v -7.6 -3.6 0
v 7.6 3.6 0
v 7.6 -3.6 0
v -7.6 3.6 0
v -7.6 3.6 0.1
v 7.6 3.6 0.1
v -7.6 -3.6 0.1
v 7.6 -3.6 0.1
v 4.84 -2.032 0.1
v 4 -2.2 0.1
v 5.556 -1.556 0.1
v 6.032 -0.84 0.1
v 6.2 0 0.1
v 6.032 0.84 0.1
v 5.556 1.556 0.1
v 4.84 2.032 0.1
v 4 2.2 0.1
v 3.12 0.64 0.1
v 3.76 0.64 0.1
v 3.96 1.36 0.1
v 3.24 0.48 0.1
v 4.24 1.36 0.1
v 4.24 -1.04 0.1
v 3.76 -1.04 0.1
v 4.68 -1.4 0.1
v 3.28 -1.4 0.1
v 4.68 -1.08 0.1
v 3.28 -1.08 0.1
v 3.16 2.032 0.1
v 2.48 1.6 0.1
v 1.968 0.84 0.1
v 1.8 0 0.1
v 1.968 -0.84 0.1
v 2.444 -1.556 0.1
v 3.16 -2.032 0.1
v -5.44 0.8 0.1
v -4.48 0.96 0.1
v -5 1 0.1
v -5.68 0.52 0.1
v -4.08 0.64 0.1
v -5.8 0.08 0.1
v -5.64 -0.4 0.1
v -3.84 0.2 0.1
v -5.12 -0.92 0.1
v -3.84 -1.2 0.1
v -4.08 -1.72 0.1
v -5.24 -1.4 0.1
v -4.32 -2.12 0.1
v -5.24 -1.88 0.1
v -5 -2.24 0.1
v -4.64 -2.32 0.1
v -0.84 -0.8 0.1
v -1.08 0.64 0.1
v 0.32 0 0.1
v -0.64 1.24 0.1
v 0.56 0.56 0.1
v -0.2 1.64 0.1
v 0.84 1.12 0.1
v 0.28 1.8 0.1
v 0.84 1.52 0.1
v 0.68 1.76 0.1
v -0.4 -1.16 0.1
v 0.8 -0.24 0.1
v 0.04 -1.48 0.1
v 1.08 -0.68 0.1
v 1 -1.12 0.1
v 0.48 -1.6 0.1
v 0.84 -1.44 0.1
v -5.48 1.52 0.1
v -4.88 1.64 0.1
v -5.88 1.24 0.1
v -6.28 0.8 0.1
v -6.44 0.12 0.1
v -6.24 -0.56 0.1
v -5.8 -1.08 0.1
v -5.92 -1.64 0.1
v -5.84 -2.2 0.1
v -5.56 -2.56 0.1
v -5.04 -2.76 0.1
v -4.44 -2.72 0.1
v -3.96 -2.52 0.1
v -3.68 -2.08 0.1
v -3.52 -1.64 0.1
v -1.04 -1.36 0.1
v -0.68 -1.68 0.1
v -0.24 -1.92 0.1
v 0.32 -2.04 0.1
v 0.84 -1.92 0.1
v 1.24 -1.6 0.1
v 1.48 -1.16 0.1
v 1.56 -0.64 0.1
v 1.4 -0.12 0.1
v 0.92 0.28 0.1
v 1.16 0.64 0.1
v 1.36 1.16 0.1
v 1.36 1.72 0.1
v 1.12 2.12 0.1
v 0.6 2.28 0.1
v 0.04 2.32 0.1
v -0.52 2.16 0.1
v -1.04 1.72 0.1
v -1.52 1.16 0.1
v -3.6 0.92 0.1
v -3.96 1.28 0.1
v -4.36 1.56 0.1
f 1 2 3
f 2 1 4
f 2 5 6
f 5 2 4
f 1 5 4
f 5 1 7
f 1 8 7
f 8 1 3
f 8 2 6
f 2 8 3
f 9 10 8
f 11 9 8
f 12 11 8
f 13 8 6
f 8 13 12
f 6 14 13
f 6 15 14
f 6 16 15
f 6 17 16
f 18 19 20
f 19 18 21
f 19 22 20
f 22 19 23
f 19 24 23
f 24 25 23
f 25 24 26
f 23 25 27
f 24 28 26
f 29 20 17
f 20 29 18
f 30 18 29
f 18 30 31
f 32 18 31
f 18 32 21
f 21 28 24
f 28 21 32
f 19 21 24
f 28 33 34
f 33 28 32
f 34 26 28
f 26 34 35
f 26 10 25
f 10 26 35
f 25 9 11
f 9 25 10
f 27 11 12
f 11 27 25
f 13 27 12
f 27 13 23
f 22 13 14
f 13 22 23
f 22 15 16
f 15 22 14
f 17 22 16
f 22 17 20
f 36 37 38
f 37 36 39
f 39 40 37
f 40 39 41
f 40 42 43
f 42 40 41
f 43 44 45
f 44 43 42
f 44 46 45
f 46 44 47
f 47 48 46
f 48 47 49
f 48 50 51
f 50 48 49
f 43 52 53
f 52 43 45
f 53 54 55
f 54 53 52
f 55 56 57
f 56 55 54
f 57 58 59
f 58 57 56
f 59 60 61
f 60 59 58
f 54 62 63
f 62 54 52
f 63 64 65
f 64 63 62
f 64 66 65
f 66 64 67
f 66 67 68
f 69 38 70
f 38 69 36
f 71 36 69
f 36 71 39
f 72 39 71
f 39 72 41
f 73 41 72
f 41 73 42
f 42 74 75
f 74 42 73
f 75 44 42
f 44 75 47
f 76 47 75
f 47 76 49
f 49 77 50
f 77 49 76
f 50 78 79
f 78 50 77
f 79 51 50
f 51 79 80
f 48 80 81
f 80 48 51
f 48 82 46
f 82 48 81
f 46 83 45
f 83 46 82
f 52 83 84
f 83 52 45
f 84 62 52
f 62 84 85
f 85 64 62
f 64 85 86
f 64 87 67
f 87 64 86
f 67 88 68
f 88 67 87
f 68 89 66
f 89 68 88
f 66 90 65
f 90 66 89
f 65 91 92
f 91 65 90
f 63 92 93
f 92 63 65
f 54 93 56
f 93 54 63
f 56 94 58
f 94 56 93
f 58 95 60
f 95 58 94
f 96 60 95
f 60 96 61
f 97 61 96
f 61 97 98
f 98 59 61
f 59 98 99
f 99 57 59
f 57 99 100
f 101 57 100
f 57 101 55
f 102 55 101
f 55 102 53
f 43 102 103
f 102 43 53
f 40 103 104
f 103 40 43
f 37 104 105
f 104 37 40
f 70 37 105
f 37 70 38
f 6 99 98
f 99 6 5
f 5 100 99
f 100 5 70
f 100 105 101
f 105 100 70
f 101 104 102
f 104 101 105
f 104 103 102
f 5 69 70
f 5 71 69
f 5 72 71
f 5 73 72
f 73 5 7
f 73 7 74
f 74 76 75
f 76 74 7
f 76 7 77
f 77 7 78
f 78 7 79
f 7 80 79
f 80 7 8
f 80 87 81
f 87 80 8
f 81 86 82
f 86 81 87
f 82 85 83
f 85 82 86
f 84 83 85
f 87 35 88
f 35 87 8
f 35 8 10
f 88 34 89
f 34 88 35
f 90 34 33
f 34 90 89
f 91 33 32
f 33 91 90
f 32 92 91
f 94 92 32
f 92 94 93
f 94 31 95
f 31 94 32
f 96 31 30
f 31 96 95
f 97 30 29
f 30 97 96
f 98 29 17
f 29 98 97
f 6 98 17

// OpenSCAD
// file: ../p/box5-12.scad
use <../lib.scad>
function ldraw_lib__box5_12() = [
// 0 Box with 5 Faces without Any Edges
// 0 Name: box5-12.dat
// 0 Author: Chris Dee [cwdee]
// 0 !LDRAW_ORG Primitive UPDATE 2009-02
// 0 !LICENSE Licensed under CC BY 4.0 : see CAreadme.txt
// 
// 0 BFC CERTIFY CCW
  [0,"BFC","CERTIFY"],
  [0,"BFC","CCW"],
// 
// 0 !HISTORY 2009-09-03 [PTadmin] Official Update 2009-02
// 
// 
// 4 16 1 1 1 1 1 -1 -1 1 -1 -1 1 1
  [4,16,1,1,1,1,1,-1,-1,1,-1,-1,1,1],
// 4 16 -1 0 1 1 0 1 1 1 1 -1 1 1
  [4,16,-1,0,1,1,0,1,1,1,1,-1,1,1],
// 4 16 -1 0 -1 -1 0 1 -1 1 1 -1 1 -1
  [4,16,-1,0,-1,-1,0,1,-1,1,1,-1,1,-1],
// 4 16 1 0 -1 -1 0 -1 -1 1 -1 1 1 -1
  [4,16,1,0,-1,-1,0,-1,-1,1,-1,1,1,-1],
// 4 16 1 0 1 1 0 -1 1 1 -1 1 1 1
  [4,16,1,0,1,1,0,-1,1,1,-1,1,1,1],
// 0
];
module ldraw_lib__box5_12(step=0, col=false, unit=2/5, alt=false, line=0.2, solid=!$preview)
    makepoly(ldraw_lib__box5_12(), step=step, col=col, unit=unit, alt=alt, line=line, solid=solid);
ldraw_lib__box5_12(line=0.2);
// main file
use <../lib.scad>
use <../p/box5-12.scad>
function ldraw_lib__6018377f() = [
// 0 Sticker  0.9 x  1.9 with Dog Bone and Medium Lavender "1" in White Circle on Medium Azure Background
// 0 Name: 6018377f.dat
// 0 Author: Takeshi Takahashi [RainbowDolphin]
// 0 !LDRAW_ORG Part UPDATE 2025-07
// 0 !LICENSE Licensed under CC BY 4.0 : see CAreadme.txt
// 
// 0 BFC CERTIFY CCW
  [0,"BFC","CERTIFY"],
  [0,"BFC","CCW"],
// 
// 0 !KEYWORDS Pet salon, Price card, Set 41007
// 
// 0 !HISTORY 2025-07-27 [OrionP] Official Update 2025-07
// 
// 
// 1 16 0 -0.25 0 19 0 0 0 0.25 0 0 0 9 box5-12.dat
  [1,16,0,-0.25,0,19,0,0,0,0.25,0,0,0,9, ldraw_lib__box5_12()],
// 3 322 12.1 -0.25 -5.08 10 -0.25 -5.5 19 -0.25 -9
  [3,322,12.1,-0.25,-5.08,10,-0.25,-5.5,19,-0.25,-9],
// 3 322 13.89 -0.25 -3.89 12.1 -0.25 -5.08 19 -0.25 -9
  [3,322,13.89,-0.25,-3.89,12.1,-0.25,-5.08,19,-0.25,-9],
// 3 322 15.08 -0.25 -2.1 13.89 -0.25 -3.89 19 -0.25 -9
  [3,322,15.08,-0.25,-2.1,13.89,-0.25,-3.89,19,-0.25,-9],
// 4 322 15.5 -0.25 0 15.08 -0.25 -2.1 19 -0.25 -9 19 -0.25 9
  [4,322,15.5,-0.25,0,15.08,-0.25,-2.1,19,-0.25,-9,19,-0.25,9],
// 3 322 19 -0.25 9 15.08 -0.25 2.1 15.5 -0.25 0
  [3,322,19,-0.25,9,15.08,-0.25,2.1,15.5,-0.25,0],
// 3 322 19 -0.25 9 13.89 -0.25 3.89 15.08 -0.25 2.1
  [3,322,19,-0.25,9,13.89,-0.25,3.89,15.08,-0.25,2.1],
// 3 322 19 -0.25 9 12.1 -0.25 5.08 13.89 -0.25 3.89
  [3,322,19,-0.25,9,12.1,-0.25,5.08,13.89,-0.25,3.89],
// 3 322 19 -0.25 9 10 -0.25 5.5 12.1 -0.25 5.08
  [3,322,19,-0.25,9,10,-0.25,5.5,12.1,-0.25,5.08],
// 4 30 7.8 -0.25 1.6 8.1 -0.25 1.2 9.4 -0.25 1.6 9.9 -0.25 3.4
  [4,30,7.8,-0.25,1.6,8.1,-0.25,1.2,9.4,-0.25,1.6,9.9,-0.25,3.4],
// 4 30 10.6 -0.25 3.4 9.9 -0.25 3.4 9.4 -0.25 1.6 10.6 -0.25 -2.6
  [4,30,10.6,-0.25,3.4,9.9,-0.25,3.4,9.4,-0.25,1.6,10.6,-0.25,-2.6],
// 3 30 9.4 -0.25 1.6 9.4 -0.25 -2.6 10.6 -0.25 -2.6
  [3,30,9.4,-0.25,1.6,9.4,-0.25,-2.6,10.6,-0.25,-2.6],
// 4 30 10.6 -0.25 -2.6 9.4 -0.25 -2.6 8.2 -0.25 -3.5 11.7 -0.25 -3.5
  [4,30,10.6,-0.25,-2.6,9.4,-0.25,-2.6,8.2,-0.25,-3.5,11.7,-0.25,-3.5],
// 3 30 10.6 -0.25 -2.6 11.7 -0.25 -3.5 11.7 -0.25 -2.7
  [3,30,10.6,-0.25,-2.6,11.7,-0.25,-3.5,11.7,-0.25,-2.7],
// 3 30 9.4 -0.25 -2.6 8.2 -0.25 -2.7 8.2 -0.25 -3.5
  [3,30,9.4,-0.25,-2.6,8.2,-0.25,-2.7,8.2,-0.25,-3.5],
// 4 15 9.9 -0.25 3.4 10 -0.25 5.5 7.9 -0.25 5.08 7.8 -0.25 1.6
  [4,15,9.9,-0.25,3.4,10,-0.25,5.5,7.9,-0.25,5.08,7.8,-0.25,1.6],
// 4 15 7.8 -0.25 1.6 7.9 -0.25 5.08 6.2 -0.25 4 4.92 -0.25 2.1
  [4,15,7.8,-0.25,1.6,7.9,-0.25,5.08,6.2,-0.25,4,4.92,-0.25,2.1],
// 4 15 8.1 -0.25 1.2 7.8 -0.25 1.6 4.92 -0.25 2.1 4.5 -0.25 0
  [4,15,8.1,-0.25,1.2,7.8,-0.25,1.6,4.92,-0.25,2.1,4.5,-0.25,0],
// 4 15 8.1 -0.25 1.2 4.5 -0.25 0 8.2 -0.25 -2.7 9.4 -0.25 -2.6
  [4,15,8.1,-0.25,1.2,4.5,-0.25,0,8.2,-0.25,-2.7,9.4,-0.25,-2.6],
// 3 15 9.4 -0.25 1.6 8.1 -0.25 1.2 9.4 -0.25 -2.6
  [3,15,9.4,-0.25,1.6,8.1,-0.25,1.2,9.4,-0.25,-2.6],
// 4 15 8.2 -0.25 -2.7 4.5 -0.25 0 4.92 -0.25 -2.1 6.11 -0.25 -3.89
  [4,15,8.2,-0.25,-2.7,4.5,-0.25,0,4.92,-0.25,-2.1,6.11,-0.25,-3.89],
// 4 15 8.2 -0.25 -3.5 8.2 -0.25 -2.7 6.11 -0.25 -3.89 7.9 -0.25 -5.08
  [4,15,8.2,-0.25,-3.5,8.2,-0.25,-2.7,6.11,-0.25,-3.89,7.9,-0.25,-5.08],
// 4 15 8.2 -0.25 -3.5 7.9 -0.25 -5.08 10 -0.25 -5.5 11.7 -0.25 -3.5
  [4,15,8.2,-0.25,-3.5,7.9,-0.25,-5.08,10,-0.25,-5.5,11.7,-0.25,-3.5],
// 4 15 11.7 -0.25 -3.5 10 -0.25 -5.5 12.1 -0.25 -5.08 13.89 -0.25 -3.89
  [4,15,11.7,-0.25,-3.5,10,-0.25,-5.5,12.1,-0.25,-5.08,13.89,-0.25,-3.89],
// 4 15 11.7 -0.25 -2.7 11.7 -0.25 -3.5 13.89 -0.25 -3.89 15.08 -0.25 -2.1
  [4,15,11.7,-0.25,-2.7,11.7,-0.25,-3.5,13.89,-0.25,-3.89,15.08,-0.25,-2.1],
// 4 15 11.7 -0.25 -2.7 15.08 -0.25 -2.1 15.5 -0.25 0 10.6 -0.25 -2.6
  [4,15,11.7,-0.25,-2.7,15.08,-0.25,-2.1,15.5,-0.25,0,10.6,-0.25,-2.6],
// 4 15 10.6 -0.25 3.4 10.6 -0.25 -2.6 15.5 -0.25 0 15.08 -0.25 2.1
  [4,15,10.6,-0.25,3.4,10.6,-0.25,-2.6,15.5,-0.25,0,15.08,-0.25,2.1],
// 4 15 10.6 -0.25 3.4 15.08 -0.25 2.1 13.89 -0.25 3.89 12.1 -0.25 5.08
  [4,15,10.6,-0.25,3.4,15.08,-0.25,2.1,13.89,-0.25,3.89,12.1,-0.25,5.08],
// 4 15 9.9 -0.25 3.4 10.6 -0.25 3.4 12.1 -0.25 5.08 10 -0.25 5.5
  [4,15,9.9,-0.25,3.4,10.6,-0.25,3.4,12.1,-0.25,5.08,10,-0.25,5.5],
// 4 15 -11.2 -0.25 2.4 -12.5 -0.25 2.5 -13.6 -0.25 2 -14.2 -0.25 1.3
  [4,15,-11.2,-0.25,2.4,-12.5,-0.25,2.5,-13.6,-0.25,2,-14.2,-0.25,1.3],
// 4 15 -10.2 -0.25 1.6 -11.2 -0.25 2.4 -14.2 -0.25 1.3 -14.5 -0.25 0.2
  [4,15,-10.2,-0.25,1.6,-11.2,-0.25,2.4,-14.2,-0.25,1.3,-14.5,-0.25,0.2],
// 4 15 -9.6 -0.25 0.5 -10.2 -0.25 1.6 -14.5 -0.25 0.2 -14.1 -0.25 -1
  [4,15,-9.6,-0.25,0.5,-10.2,-0.25,1.6,-14.5,-0.25,0.2,-14.1,-0.25,-1],
// 4 15 -9.6 -0.25 0.5 -14.1 -0.25 -1 -12.8 -0.25 -2.3 -9.6 -0.25 -3
  [4,15,-9.6,-0.25,0.5,-14.1,-0.25,-1,-12.8,-0.25,-2.3,-9.6,-0.25,-3],
// 4 15 -9.6 -0.25 -3 -12.8 -0.25 -2.3 -13.1 -0.25 -3.5 -10.2 -0.25 -4.3
  [4,15,-9.6,-0.25,-3,-12.8,-0.25,-2.3,-13.1,-0.25,-3.5,-10.2,-0.25,-4.3],
// 4 15 -10.2 -0.25 -4.3 -13.1 -0.25 -3.5 -13.1 -0.25 -4.7 -10.8 -0.25 -5.3
  [4,15,-10.2,-0.25,-4.3,-13.1,-0.25,-3.5,-13.1,-0.25,-4.7,-10.8,-0.25,-5.3],
// 4 15 -10.8 -0.25 -5.3 -13.1 -0.25 -4.7 -12.5 -0.25 -5.6 -11.6 -0.25 -5.8
  [4,15,-10.8,-0.25,-5.3,-13.1,-0.25,-4.7,-12.5,-0.25,-5.6,-11.6,-0.25,-5.8],
// 4 15 -9.6 -0.25 0.5 -9.6 -0.25 -3 -2.1 -0.25 -2 -2.7 -0.25 1.6
  [4,15,-9.6,-0.25,0.5,-9.6,-0.25,-3,-2.1,-0.25,-2,-2.7,-0.25,1.6],
// 4 15 -2.7 -0.25 1.6 -2.1 -0.25 -2 0.8 -0.25 0 -1.6 -0.25 3.1
  [4,15,-2.7,-0.25,1.6,-2.1,-0.25,-2,0.8,-0.25,0,-1.6,-0.25,3.1],
// 4 15 -1.6 -0.25 3.1 0.8 -0.25 0 1.4 -0.25 1.4 -0.5 -0.25 4.1
  [4,15,-1.6,-0.25,3.1,0.8,-0.25,0,1.4,-0.25,1.4,-0.5,-0.25,4.1],
// 4 15 -0.5 -0.25 4.1 1.4 -0.25 1.4 2.1 -0.25 2.8 0.7 -0.25 4.5
  [4,15,-0.5,-0.25,4.1,1.4,-0.25,1.4,2.1,-0.25,2.8,0.7,-0.25,4.5],
// 4 15 0.7 -0.25 4.5 2.1 -0.25 2.8 2.1 -0.25 3.8 1.7 -0.25 4.4
  [4,15,0.7,-0.25,4.5,2.1,-0.25,2.8,2.1,-0.25,3.8,1.7,-0.25,4.4],
// 4 15 0.8 -0.25 0 -2.1 -0.25 -2 -1 -0.25 -2.9 2 -0.25 -0.6
  [4,15,0.8,-0.25,0,-2.1,-0.25,-2,-1,-0.25,-2.9,2,-0.25,-0.6],
// 4 15 2 -0.25 -0.6 -1 -0.25 -2.9 0.1 -0.25 -3.7 2.7 -0.25 -1.7
  [4,15,2,-0.25,-0.6,-1,-0.25,-2.9,0.1,-0.25,-3.7,2.7,-0.25,-1.7],
// 4 15 2.7 -0.25 -1.7 0.1 -0.25 -3.7 1.2 -0.25 -4 2.5 -0.25 -2.8
  [4,15,2.7,-0.25,-1.7,0.1,-0.25,-3.7,1.2,-0.25,-4,2.5,-0.25,-2.8],
// 3 15 2.5 -0.25 -2.8 1.2 -0.25 -4 2.1 -0.25 -3.6
  [3,15,2.5,-0.25,-2.8,1.2,-0.25,-4,2.1,-0.25,-3.6],
// 4 80 -12.5 -0.25 2.5 -12.2 -0.25 4.1 -13.7 -0.25 3.8 -13.6 -0.25 2
  [4,80,-12.5,-0.25,2.5,-12.2,-0.25,4.1,-13.7,-0.25,3.8,-13.6,-0.25,2],
// 4 80 -13.6 -0.25 2 -13.7 -0.25 3.8 -14.7 -0.25 3.1 -14.2 -0.25 1.3
  [4,80,-13.6,-0.25,2,-13.7,-0.25,3.8,-14.7,-0.25,3.1,-14.2,-0.25,1.3],
// 4 80 -14.2 -0.25 1.3 -14.7 -0.25 3.1 -15.7 -0.25 2 -14.5 -0.25 0.2
  [4,80,-14.2,-0.25,1.3,-14.7,-0.25,3.1,-15.7,-0.25,2,-14.5,-0.25,0.2],
// 4 80 -14.5 -0.25 0.2 -15.7 -0.25 2 -16.1 -0.25 0.3 -14.1 -0.25 -1
  [4,80,-14.5,-0.25,0.2,-15.7,-0.25,2,-16.1,-0.25,0.3,-14.1,-0.25,-1],
// 4 80 -14.1 -0.25 -1 -16.1 -0.25 0.3 -15.6 -0.25 -1.4 -14.5 -0.25 -2.7
  [4,80,-14.1,-0.25,-1,-16.1,-0.25,0.3,-15.6,-0.25,-1.4,-14.5,-0.25,-2.7],
// 4 80 -12.8 -0.25 -2.3 -14.1 -0.25 -1 -14.5 -0.25 -2.7 -13.1 -0.25 -3.5
  [4,80,-12.8,-0.25,-2.3,-14.1,-0.25,-1,-14.5,-0.25,-2.7,-13.1,-0.25,-3.5],
// 4 80 -13.1 -0.25 -3.5 -14.5 -0.25 -2.7 -14.8 -0.25 -4.1 -13.1 -0.25 -4.7
  [4,80,-13.1,-0.25,-3.5,-14.5,-0.25,-2.7,-14.8,-0.25,-4.1,-13.1,-0.25,-4.7],
// 4 80 -13.1 -0.25 -4.7 -14.8 -0.25 -4.1 -14.6 -0.25 -5.5 -12.5 -0.25 -5.6
  [4,80,-13.1,-0.25,-4.7,-14.8,-0.25,-4.1,-14.6,-0.25,-5.5,-12.5,-0.25,-5.6],
// 4 80 -12.5 -0.25 -5.6 -14.6 -0.25 -5.5 -13.9 -0.25 -6.4 -12.6 -0.25 -6.9
  [4,80,-12.5,-0.25,-5.6,-14.6,-0.25,-5.5,-13.9,-0.25,-6.4,-12.6,-0.25,-6.9],
// 4 80 -11.6 -0.25 -5.8 -12.5 -0.25 -5.6 -12.6 -0.25 -6.9 -11.1 -0.25 -6.8
  [4,80,-11.6,-0.25,-5.8,-12.5,-0.25,-5.6,-12.6,-0.25,-6.9,-11.1,-0.25,-6.8],
// 4 80 -11.6 -0.25 -5.8 -11.1 -0.25 -6.8 -9.9 -0.25 -6.3 -10.8 -0.25 -5.3
  [4,80,-11.6,-0.25,-5.8,-11.1,-0.25,-6.8,-9.9,-0.25,-6.3,-10.8,-0.25,-5.3],
// 4 80 -10.8 -0.25 -5.3 -9.9 -0.25 -6.3 -9.2 -0.25 -5.2 -10.2 -0.25 -4.3
  [4,80,-10.8,-0.25,-5.3,-9.9,-0.25,-6.3,-9.2,-0.25,-5.2,-10.2,-0.25,-4.3],
// 4 80 -10.2 -0.25 -4.3 -9.2 -0.25 -5.2 -8.8 -0.25 -4.1 -9.6 -0.25 -3
  [4,80,-10.2,-0.25,-4.3,-9.2,-0.25,-5.2,-8.8,-0.25,-4.1,-9.6,-0.25,-3],
// 4 80 -2.1 -0.25 -2 -9.6 -0.25 -3 -8.8 -0.25 -4.1 -2.6 -0.25 -3.4
  [4,80,-2.1,-0.25,-2,-9.6,-0.25,-3,-8.8,-0.25,-4.1,-2.6,-0.25,-3.4],
// 4 80 -1 -0.25 -2.9 -2.1 -0.25 -2 -2.6 -0.25 -3.4 -1.7 -0.25 -4.2
  [4,80,-1,-0.25,-2.9,-2.1,-0.25,-2,-2.6,-0.25,-3.4,-1.7,-0.25,-4.2],
// 4 80 0.1 -0.25 -3.7 -1 -0.25 -2.9 -1.7 -0.25 -4.2 -0.6 -0.25 -4.8
  [4,80,0.1,-0.25,-3.7,-1,-0.25,-2.9,-1.7,-0.25,-4.2,-0.6,-0.25,-4.8],
// 4 80 1.2 -0.25 -4 0.1 -0.25 -3.7 -0.6 -0.25 -4.8 0.8 -0.25 -5.1
  [4,80,1.2,-0.25,-4,0.1,-0.25,-3.7,-0.6,-0.25,-4.8,0.8,-0.25,-5.1],
// 4 80 1.2 -0.25 -4 0.8 -0.25 -5.1 2.1 -0.25 -4.8 2.1 -0.25 -3.6
  [4,80,1.2,-0.25,-4,0.8,-0.25,-5.1,2.1,-0.25,-4.8,2.1,-0.25,-3.6],
// 4 80 2.1 -0.25 -3.6 2.1 -0.25 -4.8 3.1 -0.25 -4 2.5 -0.25 -2.8
  [4,80,2.1,-0.25,-3.6,2.1,-0.25,-4.8,3.1,-0.25,-4,2.5,-0.25,-2.8],
// 4 80 2.5 -0.25 -2.8 3.1 -0.25 -4 3.7 -0.25 -2.9 2.7 -0.25 -1.7
  [4,80,2.5,-0.25,-2.8,3.1,-0.25,-4,3.7,-0.25,-2.9,2.7,-0.25,-1.7],
// 4 80 2.7 -0.25 -1.7 3.7 -0.25 -2.9 3.9 -0.25 -1.6 3.5 -0.25 -0.3
  [4,80,2.7,-0.25,-1.7,3.7,-0.25,-2.9,3.9,-0.25,-1.6,3.5,-0.25,-0.3],
// 4 80 2 -0.25 -0.6 2.7 -0.25 -1.7 3.5 -0.25 -0.3 2.3 -0.25 0.7
  [4,80,2,-0.25,-0.6,2.7,-0.25,-1.7,3.5,-0.25,-0.3,2.3,-0.25,0.7],
// 4 80 0.8 -0.25 0 2 -0.25 -0.6 2.3 -0.25 0.7 1.4 -0.25 1.4
  [4,80,0.8,-0.25,0,2,-0.25,-0.6,2.3,-0.25,0.7,1.4,-0.25,1.4],
// 4 80 1.4 -0.25 1.4 2.3 -0.25 0.7 2.9 -0.25 1.6 2.1 -0.25 2.8
  [4,80,1.4,-0.25,1.4,2.3,-0.25,0.7,2.9,-0.25,1.6,2.1,-0.25,2.8],
// 4 80 2.1 -0.25 2.8 2.9 -0.25 1.6 3.4 -0.25 2.9 2.1 -0.25 3.8
  [4,80,2.1,-0.25,2.8,2.9,-0.25,1.6,3.4,-0.25,2.9,2.1,-0.25,3.8],
// 4 80 2.1 -0.25 3.8 3.4 -0.25 2.9 3.4 -0.25 4.3 1.7 -0.25 4.4
  [4,80,2.1,-0.25,3.8,3.4,-0.25,2.9,3.4,-0.25,4.3,1.7,-0.25,4.4],
// 4 80 1.7 -0.25 4.4 3.4 -0.25 4.3 2.8 -0.25 5.3 1.5 -0.25 5.7
  [4,80,1.7,-0.25,4.4,3.4,-0.25,4.3,2.8,-0.25,5.3,1.5,-0.25,5.7],
// 4 80 0.7 -0.25 4.5 1.7 -0.25 4.4 1.5 -0.25 5.7 0.1 -0.25 5.8
  [4,80,0.7,-0.25,4.5,1.7,-0.25,4.4,1.5,-0.25,5.7,0.1,-0.25,5.8],
// 4 80 -0.5 -0.25 4.1 0.7 -0.25 4.5 0.1 -0.25 5.8 -1.3 -0.25 5.4
  [4,80,-0.5,-0.25,4.1,0.7,-0.25,4.5,0.1,-0.25,5.8,-1.3,-0.25,5.4],
// 4 80 -1.6 -0.25 3.1 -0.5 -0.25 4.1 -1.3 -0.25 5.4 -2.6 -0.25 4.3
  [4,80,-1.6,-0.25,3.1,-0.5,-0.25,4.1,-1.3,-0.25,5.4,-2.6,-0.25,4.3],
// 4 80 -1.6 -0.25 3.1 -2.6 -0.25 4.3 -3.8 -0.25 2.9 -2.7 -0.25 1.6
  [4,80,-1.6,-0.25,3.1,-2.6,-0.25,4.3,-3.8,-0.25,2.9,-2.7,-0.25,1.6],
// 4 80 -9.6 -0.25 0.5 -2.7 -0.25 1.6 -3.8 -0.25 2.9 -9 -0.25 2.3
  [4,80,-9.6,-0.25,0.5,-2.7,-0.25,1.6,-3.8,-0.25,2.9,-9,-0.25,2.3],
// 4 80 -10.2 -0.25 1.6 -9.6 -0.25 0.5 -9 -0.25 2.3 -9.9 -0.25 3.2
  [4,80,-10.2,-0.25,1.6,-9.6,-0.25,0.5,-9,-0.25,2.3,-9.9,-0.25,3.2],
// 4 80 -11.2 -0.25 2.4 -10.2 -0.25 1.6 -9.9 -0.25 3.2 -10.9 -0.25 3.9
  [4,80,-11.2,-0.25,2.4,-10.2,-0.25,1.6,-9.9,-0.25,3.2,-10.9,-0.25,3.9],
// 4 80 -12.5 -0.25 2.5 -11.2 -0.25 2.4 -10.9 -0.25 3.9 -12.2 -0.25 4.1
  [4,80,-12.5,-0.25,2.5,-11.2,-0.25,2.4,-10.9,-0.25,3.9,-12.2,-0.25,4.1],
// 4 322 19 -0.25 9 -19 -0.25 9 0.1 -0.25 5.8 1.5 -0.25 5.7
  [4,322,19,-0.25,9,-19,-0.25,9,0.1,-0.25,5.8,1.5,-0.25,5.7],
// 4 322 -1.3 -0.25 5.4 0.1 -0.25 5.8 -19 -0.25 9 -12.2 -0.25 4.1
  [4,322,-1.3,-0.25,5.4,0.1,-0.25,5.8,-19,-0.25,9,-12.2,-0.25,4.1],
// 4 322 -1.3 -0.25 5.4 -12.2 -0.25 4.1 -10.9 -0.25 3.9 -2.6 -0.25 4.3
  [4,322,-1.3,-0.25,5.4,-12.2,-0.25,4.1,-10.9,-0.25,3.9,-2.6,-0.25,4.3],
// 4 322 -2.6 -0.25 4.3 -10.9 -0.25 3.9 -9.9 -0.25 3.2 -3.8 -0.25 2.9
  [4,322,-2.6,-0.25,4.3,-10.9,-0.25,3.9,-9.9,-0.25,3.2,-3.8,-0.25,2.9],
// 3 322 -9.9 -0.25 3.2 -9 -0.25 2.3 -3.8 -0.25 2.9
  [3,322,-9.9,-0.25,3.2,-9,-0.25,2.3,-3.8,-0.25,2.9],
// 3 322 -19 -0.25 9 -13.7 -0.25 3.8 -12.2 -0.25 4.1
  [3,322,-19,-0.25,9,-13.7,-0.25,3.8,-12.2,-0.25,4.1],
// 3 322 -19 -0.25 9 -14.7 -0.25 3.1 -13.7 -0.25 3.8
  [3,322,-19,-0.25,9,-14.7,-0.25,3.1,-13.7,-0.25,3.8],
// 3 322 -19 -0.25 9 -15.7 -0.25 2 -14.7 -0.25 3.1
  [3,322,-19,-0.25,9,-15.7,-0.25,2,-14.7,-0.25,3.1],
// 4 322 -16.1 -0.25 0.3 -15.7 -0.25 2 -19 -0.25 9 -19 -0.25 -9
  [4,322,-16.1,-0.25,0.3,-15.7,-0.25,2,-19,-0.25,9,-19,-0.25,-9],
// 3 322 -16.1 -0.25 0.3 -19 -0.25 -9 -15.6 -0.25 -1.4
  [3,322,-16.1,-0.25,0.3,-19,-0.25,-9,-15.6,-0.25,-1.4],
// 4 322 -15.6 -0.25 -1.4 -19 -0.25 -9 -14.8 -0.25 -4.1 -14.5 -0.25 -2.7
  [4,322,-15.6,-0.25,-1.4,-19,-0.25,-9,-14.8,-0.25,-4.1,-14.5,-0.25,-2.7],
// 3 322 -14.8 -0.25 -4.1 -19 -0.25 -9 -14.6 -0.25 -5.5
  [3,322,-14.8,-0.25,-4.1,-19,-0.25,-9,-14.6,-0.25,-5.5],
// 3 322 -14.6 -0.25 -5.5 -19 -0.25 -9 -13.9 -0.25 -6.4
  [3,322,-14.6,-0.25,-5.5,-19,-0.25,-9,-13.9,-0.25,-6.4],
// 3 322 -13.9 -0.25 -6.4 -19 -0.25 -9 -12.6 -0.25 -6.9
  [3,322,-13.9,-0.25,-6.4,-19,-0.25,-9,-12.6,-0.25,-6.9],
// 4 322 -12.6 -0.25 -6.9 -19 -0.25 -9 19 -0.25 -9 -11.1 -0.25 -6.8
  [4,322,-12.6,-0.25,-6.9,-19,-0.25,-9,19,-0.25,-9,-11.1,-0.25,-6.8],
// 4 322 -11.1 -0.25 -6.8 19 -0.25 -9 0.8 -0.25 -5.1 -9.9 -0.25 -6.3
  [4,322,-11.1,-0.25,-6.8,19,-0.25,-9,0.8,-0.25,-5.1,-9.9,-0.25,-6.3],
// 4 322 -9.9 -0.25 -6.3 0.8 -0.25 -5.1 -0.6 -0.25 -4.8 -9.2 -0.25 -5.2
  [4,322,-9.9,-0.25,-6.3,0.8,-0.25,-5.1,-0.6,-0.25,-4.8,-9.2,-0.25,-5.2],
// 4 322 -9.2 -0.25 -5.2 -0.6 -0.25 -4.8 -1.7 -0.25 -4.2 -8.8 -0.25 -4.1
  [4,322,-9.2,-0.25,-5.2,-0.6,-0.25,-4.8,-1.7,-0.25,-4.2,-8.8,-0.25,-4.1],
// 3 322 -2.6 -0.25 -3.4 -8.8 -0.25 -4.1 -1.7 -0.25 -4.2
  [3,322,-2.6,-0.25,-3.4,-8.8,-0.25,-4.1,-1.7,-0.25,-4.2],
// 4 322 2.1 -0.25 -4.8 0.8 -0.25 -5.1 19 -0.25 -9 7.9 -0.25 -5.08
  [4,322,2.1,-0.25,-4.8,0.8,-0.25,-5.1,19,-0.25,-9,7.9,-0.25,-5.08],
// 3 322 7.9 -0.25 -5.08 19 -0.25 -9 10 -0.25 -5.5
  [3,322,7.9,-0.25,-5.08,19,-0.25,-9,10,-0.25,-5.5],
// 4 322 3.1 -0.25 -4 2.1 -0.25 -4.8 7.9 -0.25 -5.08 6.11 -0.25 -3.89
  [4,322,3.1,-0.25,-4,2.1,-0.25,-4.8,7.9,-0.25,-5.08,6.11,-0.25,-3.89],
// 4 322 3.7 -0.25 -2.9 3.1 -0.25 -4 6.11 -0.25 -3.89 4.92 -0.25 -2.1
  [4,322,3.7,-0.25,-2.9,3.1,-0.25,-4,6.11,-0.25,-3.89,4.92,-0.25,-2.1],
// 4 322 3.9 -0.25 -1.6 3.7 -0.25 -2.9 4.92 -0.25 -2.1 4.5 -0.25 0
  [4,322,3.9,-0.25,-1.6,3.7,-0.25,-2.9,4.92,-0.25,-2.1,4.5,-0.25,0],
// 3 322 4.5 -0.25 0 3.5 -0.25 -0.3 3.9 -0.25 -1.6
  [3,322,4.5,-0.25,0,3.5,-0.25,-0.3,3.9,-0.25,-1.6],
// 4 322 3.5 -0.25 -0.3 4.5 -0.25 0 2.9 -0.25 1.6 2.3 -0.25 0.7
  [4,322,3.5,-0.25,-0.3,4.5,-0.25,0,2.9,-0.25,1.6,2.3,-0.25,0.7],
// 4 322 2.9 -0.25 1.6 4.5 -0.25 0 4.92 -0.25 2.1 3.4 -0.25 2.9
  [4,322,2.9,-0.25,1.6,4.5,-0.25,0,4.92,-0.25,2.1,3.4,-0.25,2.9],
// 4 322 3.4 -0.25 2.9 4.92 -0.25 2.1 6.2 -0.25 4 3.4 -0.25 4.3
  [4,322,3.4,-0.25,2.9,4.92,-0.25,2.1,6.2,-0.25,4,3.4,-0.25,4.3],
// 4 322 3.4 -0.25 4.3 6.2 -0.25 4 7.9 -0.25 5.08 2.8 -0.25 5.3
  [4,322,3.4,-0.25,4.3,6.2,-0.25,4,7.9,-0.25,5.08,2.8,-0.25,5.3],
// 4 322 2.8 -0.25 5.3 7.9 -0.25 5.08 10 -0.25 5.5 1.5 -0.25 5.7
  [4,322,2.8,-0.25,5.3,7.9,-0.25,5.08,10,-0.25,5.5,1.5,-0.25,5.7],
// 3 322 19 -0.25 9 1.5 -0.25 5.7 10 -0.25 5.5
  [3,322,19,-0.25,9,1.5,-0.25,5.7,10,-0.25,5.5],
];
module ldraw_lib__6018377f(step=0, col=false, unit=2/5, alt=false, line=0.2, solid=!$preview)
    makepoly(ldraw_lib__6018377f(), step=step, col=col, unit=unit, alt=alt, line=line, solid=solid);
ldraw_lib__6018377f(line=0.2);
